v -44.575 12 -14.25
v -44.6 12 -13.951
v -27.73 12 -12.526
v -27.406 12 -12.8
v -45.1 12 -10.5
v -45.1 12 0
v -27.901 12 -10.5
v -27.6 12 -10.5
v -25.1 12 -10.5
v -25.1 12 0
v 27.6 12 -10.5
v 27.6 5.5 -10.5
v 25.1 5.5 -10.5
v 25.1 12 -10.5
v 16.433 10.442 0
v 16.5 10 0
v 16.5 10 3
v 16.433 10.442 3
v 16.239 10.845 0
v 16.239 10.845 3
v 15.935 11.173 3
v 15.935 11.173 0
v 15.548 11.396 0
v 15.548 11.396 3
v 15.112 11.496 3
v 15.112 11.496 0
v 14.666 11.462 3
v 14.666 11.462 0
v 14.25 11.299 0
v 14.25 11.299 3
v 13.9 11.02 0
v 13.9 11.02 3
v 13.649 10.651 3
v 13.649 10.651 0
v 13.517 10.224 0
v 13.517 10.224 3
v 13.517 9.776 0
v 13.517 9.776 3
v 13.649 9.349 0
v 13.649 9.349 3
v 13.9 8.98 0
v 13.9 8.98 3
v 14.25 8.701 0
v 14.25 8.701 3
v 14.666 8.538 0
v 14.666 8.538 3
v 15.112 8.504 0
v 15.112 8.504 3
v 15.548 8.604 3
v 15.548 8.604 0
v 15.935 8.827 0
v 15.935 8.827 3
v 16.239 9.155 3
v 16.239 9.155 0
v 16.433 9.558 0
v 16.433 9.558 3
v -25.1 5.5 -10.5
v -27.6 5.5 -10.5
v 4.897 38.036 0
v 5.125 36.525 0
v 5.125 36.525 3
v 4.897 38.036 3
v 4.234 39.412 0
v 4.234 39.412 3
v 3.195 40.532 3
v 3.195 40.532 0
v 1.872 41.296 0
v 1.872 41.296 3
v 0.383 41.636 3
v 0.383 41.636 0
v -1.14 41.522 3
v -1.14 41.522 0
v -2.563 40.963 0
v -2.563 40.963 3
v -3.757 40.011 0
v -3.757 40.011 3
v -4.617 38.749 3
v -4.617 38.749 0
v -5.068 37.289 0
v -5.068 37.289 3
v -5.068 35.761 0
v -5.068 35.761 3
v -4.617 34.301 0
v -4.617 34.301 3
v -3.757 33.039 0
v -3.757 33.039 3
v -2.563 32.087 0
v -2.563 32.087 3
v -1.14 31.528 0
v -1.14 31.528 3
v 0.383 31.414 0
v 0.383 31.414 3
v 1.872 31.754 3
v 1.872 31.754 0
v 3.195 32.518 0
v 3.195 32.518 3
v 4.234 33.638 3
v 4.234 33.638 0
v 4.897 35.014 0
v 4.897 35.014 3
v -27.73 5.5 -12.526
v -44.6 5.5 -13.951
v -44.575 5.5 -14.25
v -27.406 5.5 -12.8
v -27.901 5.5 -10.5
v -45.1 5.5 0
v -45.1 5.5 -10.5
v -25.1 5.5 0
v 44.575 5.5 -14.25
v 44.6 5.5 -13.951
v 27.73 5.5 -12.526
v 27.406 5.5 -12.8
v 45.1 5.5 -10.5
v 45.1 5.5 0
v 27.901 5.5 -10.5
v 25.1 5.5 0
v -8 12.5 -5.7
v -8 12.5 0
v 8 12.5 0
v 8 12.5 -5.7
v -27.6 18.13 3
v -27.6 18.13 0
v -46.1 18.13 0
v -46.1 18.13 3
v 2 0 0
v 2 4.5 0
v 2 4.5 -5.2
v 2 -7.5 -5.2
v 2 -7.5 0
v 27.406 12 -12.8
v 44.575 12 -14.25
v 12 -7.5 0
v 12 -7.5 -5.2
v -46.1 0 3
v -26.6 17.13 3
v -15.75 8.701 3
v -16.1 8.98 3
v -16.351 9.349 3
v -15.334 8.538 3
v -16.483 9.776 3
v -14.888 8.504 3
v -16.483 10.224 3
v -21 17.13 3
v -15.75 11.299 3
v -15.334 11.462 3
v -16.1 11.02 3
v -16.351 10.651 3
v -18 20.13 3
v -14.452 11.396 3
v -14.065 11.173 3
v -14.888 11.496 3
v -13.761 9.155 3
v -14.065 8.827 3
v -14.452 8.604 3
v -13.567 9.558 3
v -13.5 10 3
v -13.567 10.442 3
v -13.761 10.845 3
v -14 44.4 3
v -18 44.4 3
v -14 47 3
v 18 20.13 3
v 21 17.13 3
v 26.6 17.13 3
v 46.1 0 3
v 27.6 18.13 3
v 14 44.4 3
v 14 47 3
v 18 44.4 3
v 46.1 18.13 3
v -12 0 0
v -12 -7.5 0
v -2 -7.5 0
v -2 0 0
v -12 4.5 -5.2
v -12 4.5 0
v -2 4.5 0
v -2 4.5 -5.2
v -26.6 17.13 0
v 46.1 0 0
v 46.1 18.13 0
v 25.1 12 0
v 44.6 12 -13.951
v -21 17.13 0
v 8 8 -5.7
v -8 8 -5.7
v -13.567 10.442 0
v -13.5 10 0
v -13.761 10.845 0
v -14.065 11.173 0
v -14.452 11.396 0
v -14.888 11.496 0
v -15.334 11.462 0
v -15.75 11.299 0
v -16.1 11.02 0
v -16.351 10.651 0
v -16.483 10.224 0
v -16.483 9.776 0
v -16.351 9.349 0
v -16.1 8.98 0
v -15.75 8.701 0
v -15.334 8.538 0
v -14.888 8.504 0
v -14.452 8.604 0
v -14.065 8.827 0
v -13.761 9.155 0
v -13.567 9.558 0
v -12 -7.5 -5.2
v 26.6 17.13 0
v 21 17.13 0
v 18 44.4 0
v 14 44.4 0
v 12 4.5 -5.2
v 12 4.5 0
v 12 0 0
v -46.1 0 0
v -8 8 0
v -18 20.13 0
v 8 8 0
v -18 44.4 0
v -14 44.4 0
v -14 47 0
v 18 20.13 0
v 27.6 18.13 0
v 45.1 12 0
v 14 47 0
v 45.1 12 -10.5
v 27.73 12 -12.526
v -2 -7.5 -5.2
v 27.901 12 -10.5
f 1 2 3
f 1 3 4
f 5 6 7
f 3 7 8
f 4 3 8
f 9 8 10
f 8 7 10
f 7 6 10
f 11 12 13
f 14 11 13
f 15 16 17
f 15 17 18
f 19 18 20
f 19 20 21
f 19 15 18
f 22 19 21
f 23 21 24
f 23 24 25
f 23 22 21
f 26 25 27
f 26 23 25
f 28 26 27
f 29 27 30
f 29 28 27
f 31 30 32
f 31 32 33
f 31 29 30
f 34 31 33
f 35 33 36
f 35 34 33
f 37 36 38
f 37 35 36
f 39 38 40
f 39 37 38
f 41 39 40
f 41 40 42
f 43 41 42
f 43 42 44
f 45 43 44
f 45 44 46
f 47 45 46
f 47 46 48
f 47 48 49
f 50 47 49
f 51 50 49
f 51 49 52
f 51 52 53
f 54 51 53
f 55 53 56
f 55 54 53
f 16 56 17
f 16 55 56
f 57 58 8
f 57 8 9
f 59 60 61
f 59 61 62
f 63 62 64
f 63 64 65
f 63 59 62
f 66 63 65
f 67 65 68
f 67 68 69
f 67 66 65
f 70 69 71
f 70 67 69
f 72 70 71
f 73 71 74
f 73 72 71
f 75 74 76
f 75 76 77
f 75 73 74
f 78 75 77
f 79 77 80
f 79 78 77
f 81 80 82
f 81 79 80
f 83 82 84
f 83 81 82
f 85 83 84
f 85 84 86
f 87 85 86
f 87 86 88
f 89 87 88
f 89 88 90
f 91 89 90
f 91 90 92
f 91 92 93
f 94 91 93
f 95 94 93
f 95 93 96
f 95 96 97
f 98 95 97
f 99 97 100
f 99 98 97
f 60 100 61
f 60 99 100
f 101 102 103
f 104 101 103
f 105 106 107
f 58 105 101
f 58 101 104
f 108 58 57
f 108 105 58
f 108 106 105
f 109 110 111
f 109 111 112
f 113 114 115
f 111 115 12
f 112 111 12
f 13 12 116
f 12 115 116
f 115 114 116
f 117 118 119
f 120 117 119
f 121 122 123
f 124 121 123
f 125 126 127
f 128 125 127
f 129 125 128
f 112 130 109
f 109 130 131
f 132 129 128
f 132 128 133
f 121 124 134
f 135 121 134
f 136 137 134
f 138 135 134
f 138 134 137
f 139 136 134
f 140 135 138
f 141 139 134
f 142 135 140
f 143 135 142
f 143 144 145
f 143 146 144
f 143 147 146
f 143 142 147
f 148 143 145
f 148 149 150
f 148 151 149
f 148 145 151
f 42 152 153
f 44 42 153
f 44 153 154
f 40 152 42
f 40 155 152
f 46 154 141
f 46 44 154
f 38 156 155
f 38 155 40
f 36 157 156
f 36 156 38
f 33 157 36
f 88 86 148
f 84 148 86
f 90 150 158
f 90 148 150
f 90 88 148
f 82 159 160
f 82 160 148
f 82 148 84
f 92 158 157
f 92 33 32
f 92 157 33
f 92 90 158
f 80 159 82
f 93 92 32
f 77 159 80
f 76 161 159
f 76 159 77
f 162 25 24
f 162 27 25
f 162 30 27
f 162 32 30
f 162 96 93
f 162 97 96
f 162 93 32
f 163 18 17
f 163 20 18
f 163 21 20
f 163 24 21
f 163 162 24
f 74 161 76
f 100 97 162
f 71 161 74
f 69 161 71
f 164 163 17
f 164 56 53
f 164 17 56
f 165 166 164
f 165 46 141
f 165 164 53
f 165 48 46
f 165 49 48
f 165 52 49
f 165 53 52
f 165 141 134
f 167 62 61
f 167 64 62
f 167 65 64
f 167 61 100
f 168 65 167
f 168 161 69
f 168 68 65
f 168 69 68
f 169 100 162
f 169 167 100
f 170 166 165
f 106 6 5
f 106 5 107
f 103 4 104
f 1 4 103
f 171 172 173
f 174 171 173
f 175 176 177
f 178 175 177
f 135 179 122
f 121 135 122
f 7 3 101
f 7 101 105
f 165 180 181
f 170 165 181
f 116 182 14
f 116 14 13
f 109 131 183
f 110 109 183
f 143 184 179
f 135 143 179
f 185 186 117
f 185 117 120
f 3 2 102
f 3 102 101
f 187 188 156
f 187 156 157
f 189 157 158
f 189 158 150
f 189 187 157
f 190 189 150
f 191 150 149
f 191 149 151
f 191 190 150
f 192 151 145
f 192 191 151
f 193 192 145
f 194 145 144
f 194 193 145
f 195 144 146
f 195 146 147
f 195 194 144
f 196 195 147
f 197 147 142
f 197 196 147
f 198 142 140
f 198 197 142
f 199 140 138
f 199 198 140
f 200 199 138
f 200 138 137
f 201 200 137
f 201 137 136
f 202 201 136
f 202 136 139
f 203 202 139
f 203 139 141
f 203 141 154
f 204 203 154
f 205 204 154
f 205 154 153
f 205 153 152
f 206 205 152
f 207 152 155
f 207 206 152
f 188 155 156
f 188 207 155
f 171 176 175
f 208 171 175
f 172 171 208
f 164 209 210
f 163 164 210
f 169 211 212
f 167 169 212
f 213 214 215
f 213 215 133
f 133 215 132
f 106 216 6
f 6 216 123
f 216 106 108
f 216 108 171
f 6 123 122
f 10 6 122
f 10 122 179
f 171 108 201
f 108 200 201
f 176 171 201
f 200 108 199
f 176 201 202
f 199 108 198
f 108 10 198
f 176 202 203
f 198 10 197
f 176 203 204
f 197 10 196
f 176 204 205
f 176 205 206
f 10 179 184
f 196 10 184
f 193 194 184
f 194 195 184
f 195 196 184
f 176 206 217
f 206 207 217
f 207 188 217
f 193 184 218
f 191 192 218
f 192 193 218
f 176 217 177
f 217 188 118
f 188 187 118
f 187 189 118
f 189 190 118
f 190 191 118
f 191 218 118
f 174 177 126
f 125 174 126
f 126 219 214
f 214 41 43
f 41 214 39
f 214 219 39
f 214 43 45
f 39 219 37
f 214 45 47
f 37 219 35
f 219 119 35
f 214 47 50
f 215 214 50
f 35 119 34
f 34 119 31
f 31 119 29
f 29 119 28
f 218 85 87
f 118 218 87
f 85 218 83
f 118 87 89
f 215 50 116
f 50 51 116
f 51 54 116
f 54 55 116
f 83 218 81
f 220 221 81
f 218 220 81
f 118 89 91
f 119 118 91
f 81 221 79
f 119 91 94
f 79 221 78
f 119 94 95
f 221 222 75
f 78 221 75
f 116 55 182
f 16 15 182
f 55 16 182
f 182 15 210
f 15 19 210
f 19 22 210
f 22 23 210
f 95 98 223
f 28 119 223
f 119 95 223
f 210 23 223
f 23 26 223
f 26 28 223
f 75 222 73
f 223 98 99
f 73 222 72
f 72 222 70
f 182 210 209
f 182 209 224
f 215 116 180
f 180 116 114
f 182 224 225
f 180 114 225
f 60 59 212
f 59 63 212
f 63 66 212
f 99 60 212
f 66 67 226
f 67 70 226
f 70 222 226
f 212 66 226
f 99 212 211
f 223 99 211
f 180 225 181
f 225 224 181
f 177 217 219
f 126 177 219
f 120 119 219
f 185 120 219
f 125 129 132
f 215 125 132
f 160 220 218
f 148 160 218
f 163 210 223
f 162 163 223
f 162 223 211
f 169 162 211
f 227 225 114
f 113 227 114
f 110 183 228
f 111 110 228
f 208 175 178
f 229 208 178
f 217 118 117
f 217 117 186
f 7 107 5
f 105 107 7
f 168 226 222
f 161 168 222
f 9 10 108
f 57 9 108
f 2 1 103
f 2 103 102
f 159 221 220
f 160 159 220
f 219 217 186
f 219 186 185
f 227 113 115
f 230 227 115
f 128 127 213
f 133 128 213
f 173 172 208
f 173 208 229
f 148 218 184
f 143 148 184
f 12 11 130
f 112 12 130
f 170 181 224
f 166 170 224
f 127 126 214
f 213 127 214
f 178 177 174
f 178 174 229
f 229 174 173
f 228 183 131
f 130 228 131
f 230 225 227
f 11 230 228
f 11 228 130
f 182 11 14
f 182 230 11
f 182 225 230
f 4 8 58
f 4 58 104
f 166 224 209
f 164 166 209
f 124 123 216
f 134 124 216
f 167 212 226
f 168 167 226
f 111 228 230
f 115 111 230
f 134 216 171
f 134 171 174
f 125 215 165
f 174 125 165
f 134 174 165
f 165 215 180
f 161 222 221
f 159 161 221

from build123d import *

# Parameters (mm, degrees)
F0_R     = 1.5
F0_R_2   = 5.125
F1_DEPTH = 3
F2_W     = 20
F2_H     = 6.5
F3_DEPTH = 10.5
F5_DEPTH = 6.5
F6_W     = 16
F6_H     = 4.5
F7_DEPTH = 5.7
F8_W     = 10
F8_H     = 12
F9_DEPTH = 5.2


# Not quite as in the source:
# - a pattern or mirror of a feature is missing from the dataset's text; its kind, count and spacing are read off the source's solid


with BuildPart() as f1:
    # F0 (on Top) → F1 (new body)
    with BuildSketch(Plane.XY):
        Polygon((-46.1, 18.13), (-46.1, 0), (46.1, 0), (46.1, 18.13), (27.6, 18.13), (26.6, 17.13), (21, 17.13), (18, 20.13), (18, 44.4), (14, 44.4), (14, 47), (-14, 47), (-14, 44.4), (-18, 44.4), (-18, 20.13), (-21, 17.13), (-26.6, 17.13), (-27.6, 18.13), align=None)
        with Locations((-15, 10)):
            Circle(F0_R, mode=Mode.SUBTRACT)
        with Locations((15, 10)):
            Circle(F0_R, mode=Mode.SUBTRACT)
        with Locations((0, 36.525)):
            Circle(F0_R_2, mode=Mode.SUBTRACT)
    extrude(amount=F1_DEPTH)

    # F2 (on face) → F3 (join)
    with BuildSketch(Plane(origin=(0, 0, 0), x_dir=(1, 0, 0), z_dir=(0, 0, -1))):
        with Locations((-35.1, -8.75)):
            Rectangle(F2_W, F2_H)
    f3 = extrude(amount=F3_DEPTH)

    # F3_copies: F3 across plane
    add(f3.mirror(Plane(origin=(0, 0, 0), x_dir=(0, 0, 1), z_dir=(1, 0, 0))))

    # F4 (on face) → F5 (join, through all)
    with BuildSketch(Plane(origin=(0, 12, 0), x_dir=(-1, 0, 0), z_dir=(0, 1, 0))):
        Polygon((44.5747535126, -14.25), (44.6, -13.9510641961), (27.7299368373, -12.5263106834), (27.9010679845, -10.5), (27.6, -10.5), (27.4057545459, -12.8), align=None)
    f5 = extrude(amount=-F5_DEPTH)

    # F5_copies: F5 across plane
    add(f5.mirror(Plane(origin=(0, 0, 0), x_dir=(0, 0, 1), z_dir=(1, 0, 0))))

    # F6 (on face) → F7 (join)
    with BuildSketch(Plane(origin=(0, 0, 0), x_dir=(1, 0, 0), z_dir=(0, 0, -1))):
        with Locations((0, -10.25)):
            Rectangle(F6_W, F6_H)
    extrude(amount=F7_DEPTH)

    # F8 (on face) → F9 (join)
    with BuildSketch(Plane(origin=(0, 0, 0), x_dir=(1, 0, 0), z_dir=(0, 0, -1))):
        with Locations((-7, 1.5)):
            Rectangle(F8_W, F8_H)
        with Locations((7, 1.5)):
            Rectangle(F8_W, F8_H)
    extrude(amount=F9_DEPTH)


solid = f1.part
